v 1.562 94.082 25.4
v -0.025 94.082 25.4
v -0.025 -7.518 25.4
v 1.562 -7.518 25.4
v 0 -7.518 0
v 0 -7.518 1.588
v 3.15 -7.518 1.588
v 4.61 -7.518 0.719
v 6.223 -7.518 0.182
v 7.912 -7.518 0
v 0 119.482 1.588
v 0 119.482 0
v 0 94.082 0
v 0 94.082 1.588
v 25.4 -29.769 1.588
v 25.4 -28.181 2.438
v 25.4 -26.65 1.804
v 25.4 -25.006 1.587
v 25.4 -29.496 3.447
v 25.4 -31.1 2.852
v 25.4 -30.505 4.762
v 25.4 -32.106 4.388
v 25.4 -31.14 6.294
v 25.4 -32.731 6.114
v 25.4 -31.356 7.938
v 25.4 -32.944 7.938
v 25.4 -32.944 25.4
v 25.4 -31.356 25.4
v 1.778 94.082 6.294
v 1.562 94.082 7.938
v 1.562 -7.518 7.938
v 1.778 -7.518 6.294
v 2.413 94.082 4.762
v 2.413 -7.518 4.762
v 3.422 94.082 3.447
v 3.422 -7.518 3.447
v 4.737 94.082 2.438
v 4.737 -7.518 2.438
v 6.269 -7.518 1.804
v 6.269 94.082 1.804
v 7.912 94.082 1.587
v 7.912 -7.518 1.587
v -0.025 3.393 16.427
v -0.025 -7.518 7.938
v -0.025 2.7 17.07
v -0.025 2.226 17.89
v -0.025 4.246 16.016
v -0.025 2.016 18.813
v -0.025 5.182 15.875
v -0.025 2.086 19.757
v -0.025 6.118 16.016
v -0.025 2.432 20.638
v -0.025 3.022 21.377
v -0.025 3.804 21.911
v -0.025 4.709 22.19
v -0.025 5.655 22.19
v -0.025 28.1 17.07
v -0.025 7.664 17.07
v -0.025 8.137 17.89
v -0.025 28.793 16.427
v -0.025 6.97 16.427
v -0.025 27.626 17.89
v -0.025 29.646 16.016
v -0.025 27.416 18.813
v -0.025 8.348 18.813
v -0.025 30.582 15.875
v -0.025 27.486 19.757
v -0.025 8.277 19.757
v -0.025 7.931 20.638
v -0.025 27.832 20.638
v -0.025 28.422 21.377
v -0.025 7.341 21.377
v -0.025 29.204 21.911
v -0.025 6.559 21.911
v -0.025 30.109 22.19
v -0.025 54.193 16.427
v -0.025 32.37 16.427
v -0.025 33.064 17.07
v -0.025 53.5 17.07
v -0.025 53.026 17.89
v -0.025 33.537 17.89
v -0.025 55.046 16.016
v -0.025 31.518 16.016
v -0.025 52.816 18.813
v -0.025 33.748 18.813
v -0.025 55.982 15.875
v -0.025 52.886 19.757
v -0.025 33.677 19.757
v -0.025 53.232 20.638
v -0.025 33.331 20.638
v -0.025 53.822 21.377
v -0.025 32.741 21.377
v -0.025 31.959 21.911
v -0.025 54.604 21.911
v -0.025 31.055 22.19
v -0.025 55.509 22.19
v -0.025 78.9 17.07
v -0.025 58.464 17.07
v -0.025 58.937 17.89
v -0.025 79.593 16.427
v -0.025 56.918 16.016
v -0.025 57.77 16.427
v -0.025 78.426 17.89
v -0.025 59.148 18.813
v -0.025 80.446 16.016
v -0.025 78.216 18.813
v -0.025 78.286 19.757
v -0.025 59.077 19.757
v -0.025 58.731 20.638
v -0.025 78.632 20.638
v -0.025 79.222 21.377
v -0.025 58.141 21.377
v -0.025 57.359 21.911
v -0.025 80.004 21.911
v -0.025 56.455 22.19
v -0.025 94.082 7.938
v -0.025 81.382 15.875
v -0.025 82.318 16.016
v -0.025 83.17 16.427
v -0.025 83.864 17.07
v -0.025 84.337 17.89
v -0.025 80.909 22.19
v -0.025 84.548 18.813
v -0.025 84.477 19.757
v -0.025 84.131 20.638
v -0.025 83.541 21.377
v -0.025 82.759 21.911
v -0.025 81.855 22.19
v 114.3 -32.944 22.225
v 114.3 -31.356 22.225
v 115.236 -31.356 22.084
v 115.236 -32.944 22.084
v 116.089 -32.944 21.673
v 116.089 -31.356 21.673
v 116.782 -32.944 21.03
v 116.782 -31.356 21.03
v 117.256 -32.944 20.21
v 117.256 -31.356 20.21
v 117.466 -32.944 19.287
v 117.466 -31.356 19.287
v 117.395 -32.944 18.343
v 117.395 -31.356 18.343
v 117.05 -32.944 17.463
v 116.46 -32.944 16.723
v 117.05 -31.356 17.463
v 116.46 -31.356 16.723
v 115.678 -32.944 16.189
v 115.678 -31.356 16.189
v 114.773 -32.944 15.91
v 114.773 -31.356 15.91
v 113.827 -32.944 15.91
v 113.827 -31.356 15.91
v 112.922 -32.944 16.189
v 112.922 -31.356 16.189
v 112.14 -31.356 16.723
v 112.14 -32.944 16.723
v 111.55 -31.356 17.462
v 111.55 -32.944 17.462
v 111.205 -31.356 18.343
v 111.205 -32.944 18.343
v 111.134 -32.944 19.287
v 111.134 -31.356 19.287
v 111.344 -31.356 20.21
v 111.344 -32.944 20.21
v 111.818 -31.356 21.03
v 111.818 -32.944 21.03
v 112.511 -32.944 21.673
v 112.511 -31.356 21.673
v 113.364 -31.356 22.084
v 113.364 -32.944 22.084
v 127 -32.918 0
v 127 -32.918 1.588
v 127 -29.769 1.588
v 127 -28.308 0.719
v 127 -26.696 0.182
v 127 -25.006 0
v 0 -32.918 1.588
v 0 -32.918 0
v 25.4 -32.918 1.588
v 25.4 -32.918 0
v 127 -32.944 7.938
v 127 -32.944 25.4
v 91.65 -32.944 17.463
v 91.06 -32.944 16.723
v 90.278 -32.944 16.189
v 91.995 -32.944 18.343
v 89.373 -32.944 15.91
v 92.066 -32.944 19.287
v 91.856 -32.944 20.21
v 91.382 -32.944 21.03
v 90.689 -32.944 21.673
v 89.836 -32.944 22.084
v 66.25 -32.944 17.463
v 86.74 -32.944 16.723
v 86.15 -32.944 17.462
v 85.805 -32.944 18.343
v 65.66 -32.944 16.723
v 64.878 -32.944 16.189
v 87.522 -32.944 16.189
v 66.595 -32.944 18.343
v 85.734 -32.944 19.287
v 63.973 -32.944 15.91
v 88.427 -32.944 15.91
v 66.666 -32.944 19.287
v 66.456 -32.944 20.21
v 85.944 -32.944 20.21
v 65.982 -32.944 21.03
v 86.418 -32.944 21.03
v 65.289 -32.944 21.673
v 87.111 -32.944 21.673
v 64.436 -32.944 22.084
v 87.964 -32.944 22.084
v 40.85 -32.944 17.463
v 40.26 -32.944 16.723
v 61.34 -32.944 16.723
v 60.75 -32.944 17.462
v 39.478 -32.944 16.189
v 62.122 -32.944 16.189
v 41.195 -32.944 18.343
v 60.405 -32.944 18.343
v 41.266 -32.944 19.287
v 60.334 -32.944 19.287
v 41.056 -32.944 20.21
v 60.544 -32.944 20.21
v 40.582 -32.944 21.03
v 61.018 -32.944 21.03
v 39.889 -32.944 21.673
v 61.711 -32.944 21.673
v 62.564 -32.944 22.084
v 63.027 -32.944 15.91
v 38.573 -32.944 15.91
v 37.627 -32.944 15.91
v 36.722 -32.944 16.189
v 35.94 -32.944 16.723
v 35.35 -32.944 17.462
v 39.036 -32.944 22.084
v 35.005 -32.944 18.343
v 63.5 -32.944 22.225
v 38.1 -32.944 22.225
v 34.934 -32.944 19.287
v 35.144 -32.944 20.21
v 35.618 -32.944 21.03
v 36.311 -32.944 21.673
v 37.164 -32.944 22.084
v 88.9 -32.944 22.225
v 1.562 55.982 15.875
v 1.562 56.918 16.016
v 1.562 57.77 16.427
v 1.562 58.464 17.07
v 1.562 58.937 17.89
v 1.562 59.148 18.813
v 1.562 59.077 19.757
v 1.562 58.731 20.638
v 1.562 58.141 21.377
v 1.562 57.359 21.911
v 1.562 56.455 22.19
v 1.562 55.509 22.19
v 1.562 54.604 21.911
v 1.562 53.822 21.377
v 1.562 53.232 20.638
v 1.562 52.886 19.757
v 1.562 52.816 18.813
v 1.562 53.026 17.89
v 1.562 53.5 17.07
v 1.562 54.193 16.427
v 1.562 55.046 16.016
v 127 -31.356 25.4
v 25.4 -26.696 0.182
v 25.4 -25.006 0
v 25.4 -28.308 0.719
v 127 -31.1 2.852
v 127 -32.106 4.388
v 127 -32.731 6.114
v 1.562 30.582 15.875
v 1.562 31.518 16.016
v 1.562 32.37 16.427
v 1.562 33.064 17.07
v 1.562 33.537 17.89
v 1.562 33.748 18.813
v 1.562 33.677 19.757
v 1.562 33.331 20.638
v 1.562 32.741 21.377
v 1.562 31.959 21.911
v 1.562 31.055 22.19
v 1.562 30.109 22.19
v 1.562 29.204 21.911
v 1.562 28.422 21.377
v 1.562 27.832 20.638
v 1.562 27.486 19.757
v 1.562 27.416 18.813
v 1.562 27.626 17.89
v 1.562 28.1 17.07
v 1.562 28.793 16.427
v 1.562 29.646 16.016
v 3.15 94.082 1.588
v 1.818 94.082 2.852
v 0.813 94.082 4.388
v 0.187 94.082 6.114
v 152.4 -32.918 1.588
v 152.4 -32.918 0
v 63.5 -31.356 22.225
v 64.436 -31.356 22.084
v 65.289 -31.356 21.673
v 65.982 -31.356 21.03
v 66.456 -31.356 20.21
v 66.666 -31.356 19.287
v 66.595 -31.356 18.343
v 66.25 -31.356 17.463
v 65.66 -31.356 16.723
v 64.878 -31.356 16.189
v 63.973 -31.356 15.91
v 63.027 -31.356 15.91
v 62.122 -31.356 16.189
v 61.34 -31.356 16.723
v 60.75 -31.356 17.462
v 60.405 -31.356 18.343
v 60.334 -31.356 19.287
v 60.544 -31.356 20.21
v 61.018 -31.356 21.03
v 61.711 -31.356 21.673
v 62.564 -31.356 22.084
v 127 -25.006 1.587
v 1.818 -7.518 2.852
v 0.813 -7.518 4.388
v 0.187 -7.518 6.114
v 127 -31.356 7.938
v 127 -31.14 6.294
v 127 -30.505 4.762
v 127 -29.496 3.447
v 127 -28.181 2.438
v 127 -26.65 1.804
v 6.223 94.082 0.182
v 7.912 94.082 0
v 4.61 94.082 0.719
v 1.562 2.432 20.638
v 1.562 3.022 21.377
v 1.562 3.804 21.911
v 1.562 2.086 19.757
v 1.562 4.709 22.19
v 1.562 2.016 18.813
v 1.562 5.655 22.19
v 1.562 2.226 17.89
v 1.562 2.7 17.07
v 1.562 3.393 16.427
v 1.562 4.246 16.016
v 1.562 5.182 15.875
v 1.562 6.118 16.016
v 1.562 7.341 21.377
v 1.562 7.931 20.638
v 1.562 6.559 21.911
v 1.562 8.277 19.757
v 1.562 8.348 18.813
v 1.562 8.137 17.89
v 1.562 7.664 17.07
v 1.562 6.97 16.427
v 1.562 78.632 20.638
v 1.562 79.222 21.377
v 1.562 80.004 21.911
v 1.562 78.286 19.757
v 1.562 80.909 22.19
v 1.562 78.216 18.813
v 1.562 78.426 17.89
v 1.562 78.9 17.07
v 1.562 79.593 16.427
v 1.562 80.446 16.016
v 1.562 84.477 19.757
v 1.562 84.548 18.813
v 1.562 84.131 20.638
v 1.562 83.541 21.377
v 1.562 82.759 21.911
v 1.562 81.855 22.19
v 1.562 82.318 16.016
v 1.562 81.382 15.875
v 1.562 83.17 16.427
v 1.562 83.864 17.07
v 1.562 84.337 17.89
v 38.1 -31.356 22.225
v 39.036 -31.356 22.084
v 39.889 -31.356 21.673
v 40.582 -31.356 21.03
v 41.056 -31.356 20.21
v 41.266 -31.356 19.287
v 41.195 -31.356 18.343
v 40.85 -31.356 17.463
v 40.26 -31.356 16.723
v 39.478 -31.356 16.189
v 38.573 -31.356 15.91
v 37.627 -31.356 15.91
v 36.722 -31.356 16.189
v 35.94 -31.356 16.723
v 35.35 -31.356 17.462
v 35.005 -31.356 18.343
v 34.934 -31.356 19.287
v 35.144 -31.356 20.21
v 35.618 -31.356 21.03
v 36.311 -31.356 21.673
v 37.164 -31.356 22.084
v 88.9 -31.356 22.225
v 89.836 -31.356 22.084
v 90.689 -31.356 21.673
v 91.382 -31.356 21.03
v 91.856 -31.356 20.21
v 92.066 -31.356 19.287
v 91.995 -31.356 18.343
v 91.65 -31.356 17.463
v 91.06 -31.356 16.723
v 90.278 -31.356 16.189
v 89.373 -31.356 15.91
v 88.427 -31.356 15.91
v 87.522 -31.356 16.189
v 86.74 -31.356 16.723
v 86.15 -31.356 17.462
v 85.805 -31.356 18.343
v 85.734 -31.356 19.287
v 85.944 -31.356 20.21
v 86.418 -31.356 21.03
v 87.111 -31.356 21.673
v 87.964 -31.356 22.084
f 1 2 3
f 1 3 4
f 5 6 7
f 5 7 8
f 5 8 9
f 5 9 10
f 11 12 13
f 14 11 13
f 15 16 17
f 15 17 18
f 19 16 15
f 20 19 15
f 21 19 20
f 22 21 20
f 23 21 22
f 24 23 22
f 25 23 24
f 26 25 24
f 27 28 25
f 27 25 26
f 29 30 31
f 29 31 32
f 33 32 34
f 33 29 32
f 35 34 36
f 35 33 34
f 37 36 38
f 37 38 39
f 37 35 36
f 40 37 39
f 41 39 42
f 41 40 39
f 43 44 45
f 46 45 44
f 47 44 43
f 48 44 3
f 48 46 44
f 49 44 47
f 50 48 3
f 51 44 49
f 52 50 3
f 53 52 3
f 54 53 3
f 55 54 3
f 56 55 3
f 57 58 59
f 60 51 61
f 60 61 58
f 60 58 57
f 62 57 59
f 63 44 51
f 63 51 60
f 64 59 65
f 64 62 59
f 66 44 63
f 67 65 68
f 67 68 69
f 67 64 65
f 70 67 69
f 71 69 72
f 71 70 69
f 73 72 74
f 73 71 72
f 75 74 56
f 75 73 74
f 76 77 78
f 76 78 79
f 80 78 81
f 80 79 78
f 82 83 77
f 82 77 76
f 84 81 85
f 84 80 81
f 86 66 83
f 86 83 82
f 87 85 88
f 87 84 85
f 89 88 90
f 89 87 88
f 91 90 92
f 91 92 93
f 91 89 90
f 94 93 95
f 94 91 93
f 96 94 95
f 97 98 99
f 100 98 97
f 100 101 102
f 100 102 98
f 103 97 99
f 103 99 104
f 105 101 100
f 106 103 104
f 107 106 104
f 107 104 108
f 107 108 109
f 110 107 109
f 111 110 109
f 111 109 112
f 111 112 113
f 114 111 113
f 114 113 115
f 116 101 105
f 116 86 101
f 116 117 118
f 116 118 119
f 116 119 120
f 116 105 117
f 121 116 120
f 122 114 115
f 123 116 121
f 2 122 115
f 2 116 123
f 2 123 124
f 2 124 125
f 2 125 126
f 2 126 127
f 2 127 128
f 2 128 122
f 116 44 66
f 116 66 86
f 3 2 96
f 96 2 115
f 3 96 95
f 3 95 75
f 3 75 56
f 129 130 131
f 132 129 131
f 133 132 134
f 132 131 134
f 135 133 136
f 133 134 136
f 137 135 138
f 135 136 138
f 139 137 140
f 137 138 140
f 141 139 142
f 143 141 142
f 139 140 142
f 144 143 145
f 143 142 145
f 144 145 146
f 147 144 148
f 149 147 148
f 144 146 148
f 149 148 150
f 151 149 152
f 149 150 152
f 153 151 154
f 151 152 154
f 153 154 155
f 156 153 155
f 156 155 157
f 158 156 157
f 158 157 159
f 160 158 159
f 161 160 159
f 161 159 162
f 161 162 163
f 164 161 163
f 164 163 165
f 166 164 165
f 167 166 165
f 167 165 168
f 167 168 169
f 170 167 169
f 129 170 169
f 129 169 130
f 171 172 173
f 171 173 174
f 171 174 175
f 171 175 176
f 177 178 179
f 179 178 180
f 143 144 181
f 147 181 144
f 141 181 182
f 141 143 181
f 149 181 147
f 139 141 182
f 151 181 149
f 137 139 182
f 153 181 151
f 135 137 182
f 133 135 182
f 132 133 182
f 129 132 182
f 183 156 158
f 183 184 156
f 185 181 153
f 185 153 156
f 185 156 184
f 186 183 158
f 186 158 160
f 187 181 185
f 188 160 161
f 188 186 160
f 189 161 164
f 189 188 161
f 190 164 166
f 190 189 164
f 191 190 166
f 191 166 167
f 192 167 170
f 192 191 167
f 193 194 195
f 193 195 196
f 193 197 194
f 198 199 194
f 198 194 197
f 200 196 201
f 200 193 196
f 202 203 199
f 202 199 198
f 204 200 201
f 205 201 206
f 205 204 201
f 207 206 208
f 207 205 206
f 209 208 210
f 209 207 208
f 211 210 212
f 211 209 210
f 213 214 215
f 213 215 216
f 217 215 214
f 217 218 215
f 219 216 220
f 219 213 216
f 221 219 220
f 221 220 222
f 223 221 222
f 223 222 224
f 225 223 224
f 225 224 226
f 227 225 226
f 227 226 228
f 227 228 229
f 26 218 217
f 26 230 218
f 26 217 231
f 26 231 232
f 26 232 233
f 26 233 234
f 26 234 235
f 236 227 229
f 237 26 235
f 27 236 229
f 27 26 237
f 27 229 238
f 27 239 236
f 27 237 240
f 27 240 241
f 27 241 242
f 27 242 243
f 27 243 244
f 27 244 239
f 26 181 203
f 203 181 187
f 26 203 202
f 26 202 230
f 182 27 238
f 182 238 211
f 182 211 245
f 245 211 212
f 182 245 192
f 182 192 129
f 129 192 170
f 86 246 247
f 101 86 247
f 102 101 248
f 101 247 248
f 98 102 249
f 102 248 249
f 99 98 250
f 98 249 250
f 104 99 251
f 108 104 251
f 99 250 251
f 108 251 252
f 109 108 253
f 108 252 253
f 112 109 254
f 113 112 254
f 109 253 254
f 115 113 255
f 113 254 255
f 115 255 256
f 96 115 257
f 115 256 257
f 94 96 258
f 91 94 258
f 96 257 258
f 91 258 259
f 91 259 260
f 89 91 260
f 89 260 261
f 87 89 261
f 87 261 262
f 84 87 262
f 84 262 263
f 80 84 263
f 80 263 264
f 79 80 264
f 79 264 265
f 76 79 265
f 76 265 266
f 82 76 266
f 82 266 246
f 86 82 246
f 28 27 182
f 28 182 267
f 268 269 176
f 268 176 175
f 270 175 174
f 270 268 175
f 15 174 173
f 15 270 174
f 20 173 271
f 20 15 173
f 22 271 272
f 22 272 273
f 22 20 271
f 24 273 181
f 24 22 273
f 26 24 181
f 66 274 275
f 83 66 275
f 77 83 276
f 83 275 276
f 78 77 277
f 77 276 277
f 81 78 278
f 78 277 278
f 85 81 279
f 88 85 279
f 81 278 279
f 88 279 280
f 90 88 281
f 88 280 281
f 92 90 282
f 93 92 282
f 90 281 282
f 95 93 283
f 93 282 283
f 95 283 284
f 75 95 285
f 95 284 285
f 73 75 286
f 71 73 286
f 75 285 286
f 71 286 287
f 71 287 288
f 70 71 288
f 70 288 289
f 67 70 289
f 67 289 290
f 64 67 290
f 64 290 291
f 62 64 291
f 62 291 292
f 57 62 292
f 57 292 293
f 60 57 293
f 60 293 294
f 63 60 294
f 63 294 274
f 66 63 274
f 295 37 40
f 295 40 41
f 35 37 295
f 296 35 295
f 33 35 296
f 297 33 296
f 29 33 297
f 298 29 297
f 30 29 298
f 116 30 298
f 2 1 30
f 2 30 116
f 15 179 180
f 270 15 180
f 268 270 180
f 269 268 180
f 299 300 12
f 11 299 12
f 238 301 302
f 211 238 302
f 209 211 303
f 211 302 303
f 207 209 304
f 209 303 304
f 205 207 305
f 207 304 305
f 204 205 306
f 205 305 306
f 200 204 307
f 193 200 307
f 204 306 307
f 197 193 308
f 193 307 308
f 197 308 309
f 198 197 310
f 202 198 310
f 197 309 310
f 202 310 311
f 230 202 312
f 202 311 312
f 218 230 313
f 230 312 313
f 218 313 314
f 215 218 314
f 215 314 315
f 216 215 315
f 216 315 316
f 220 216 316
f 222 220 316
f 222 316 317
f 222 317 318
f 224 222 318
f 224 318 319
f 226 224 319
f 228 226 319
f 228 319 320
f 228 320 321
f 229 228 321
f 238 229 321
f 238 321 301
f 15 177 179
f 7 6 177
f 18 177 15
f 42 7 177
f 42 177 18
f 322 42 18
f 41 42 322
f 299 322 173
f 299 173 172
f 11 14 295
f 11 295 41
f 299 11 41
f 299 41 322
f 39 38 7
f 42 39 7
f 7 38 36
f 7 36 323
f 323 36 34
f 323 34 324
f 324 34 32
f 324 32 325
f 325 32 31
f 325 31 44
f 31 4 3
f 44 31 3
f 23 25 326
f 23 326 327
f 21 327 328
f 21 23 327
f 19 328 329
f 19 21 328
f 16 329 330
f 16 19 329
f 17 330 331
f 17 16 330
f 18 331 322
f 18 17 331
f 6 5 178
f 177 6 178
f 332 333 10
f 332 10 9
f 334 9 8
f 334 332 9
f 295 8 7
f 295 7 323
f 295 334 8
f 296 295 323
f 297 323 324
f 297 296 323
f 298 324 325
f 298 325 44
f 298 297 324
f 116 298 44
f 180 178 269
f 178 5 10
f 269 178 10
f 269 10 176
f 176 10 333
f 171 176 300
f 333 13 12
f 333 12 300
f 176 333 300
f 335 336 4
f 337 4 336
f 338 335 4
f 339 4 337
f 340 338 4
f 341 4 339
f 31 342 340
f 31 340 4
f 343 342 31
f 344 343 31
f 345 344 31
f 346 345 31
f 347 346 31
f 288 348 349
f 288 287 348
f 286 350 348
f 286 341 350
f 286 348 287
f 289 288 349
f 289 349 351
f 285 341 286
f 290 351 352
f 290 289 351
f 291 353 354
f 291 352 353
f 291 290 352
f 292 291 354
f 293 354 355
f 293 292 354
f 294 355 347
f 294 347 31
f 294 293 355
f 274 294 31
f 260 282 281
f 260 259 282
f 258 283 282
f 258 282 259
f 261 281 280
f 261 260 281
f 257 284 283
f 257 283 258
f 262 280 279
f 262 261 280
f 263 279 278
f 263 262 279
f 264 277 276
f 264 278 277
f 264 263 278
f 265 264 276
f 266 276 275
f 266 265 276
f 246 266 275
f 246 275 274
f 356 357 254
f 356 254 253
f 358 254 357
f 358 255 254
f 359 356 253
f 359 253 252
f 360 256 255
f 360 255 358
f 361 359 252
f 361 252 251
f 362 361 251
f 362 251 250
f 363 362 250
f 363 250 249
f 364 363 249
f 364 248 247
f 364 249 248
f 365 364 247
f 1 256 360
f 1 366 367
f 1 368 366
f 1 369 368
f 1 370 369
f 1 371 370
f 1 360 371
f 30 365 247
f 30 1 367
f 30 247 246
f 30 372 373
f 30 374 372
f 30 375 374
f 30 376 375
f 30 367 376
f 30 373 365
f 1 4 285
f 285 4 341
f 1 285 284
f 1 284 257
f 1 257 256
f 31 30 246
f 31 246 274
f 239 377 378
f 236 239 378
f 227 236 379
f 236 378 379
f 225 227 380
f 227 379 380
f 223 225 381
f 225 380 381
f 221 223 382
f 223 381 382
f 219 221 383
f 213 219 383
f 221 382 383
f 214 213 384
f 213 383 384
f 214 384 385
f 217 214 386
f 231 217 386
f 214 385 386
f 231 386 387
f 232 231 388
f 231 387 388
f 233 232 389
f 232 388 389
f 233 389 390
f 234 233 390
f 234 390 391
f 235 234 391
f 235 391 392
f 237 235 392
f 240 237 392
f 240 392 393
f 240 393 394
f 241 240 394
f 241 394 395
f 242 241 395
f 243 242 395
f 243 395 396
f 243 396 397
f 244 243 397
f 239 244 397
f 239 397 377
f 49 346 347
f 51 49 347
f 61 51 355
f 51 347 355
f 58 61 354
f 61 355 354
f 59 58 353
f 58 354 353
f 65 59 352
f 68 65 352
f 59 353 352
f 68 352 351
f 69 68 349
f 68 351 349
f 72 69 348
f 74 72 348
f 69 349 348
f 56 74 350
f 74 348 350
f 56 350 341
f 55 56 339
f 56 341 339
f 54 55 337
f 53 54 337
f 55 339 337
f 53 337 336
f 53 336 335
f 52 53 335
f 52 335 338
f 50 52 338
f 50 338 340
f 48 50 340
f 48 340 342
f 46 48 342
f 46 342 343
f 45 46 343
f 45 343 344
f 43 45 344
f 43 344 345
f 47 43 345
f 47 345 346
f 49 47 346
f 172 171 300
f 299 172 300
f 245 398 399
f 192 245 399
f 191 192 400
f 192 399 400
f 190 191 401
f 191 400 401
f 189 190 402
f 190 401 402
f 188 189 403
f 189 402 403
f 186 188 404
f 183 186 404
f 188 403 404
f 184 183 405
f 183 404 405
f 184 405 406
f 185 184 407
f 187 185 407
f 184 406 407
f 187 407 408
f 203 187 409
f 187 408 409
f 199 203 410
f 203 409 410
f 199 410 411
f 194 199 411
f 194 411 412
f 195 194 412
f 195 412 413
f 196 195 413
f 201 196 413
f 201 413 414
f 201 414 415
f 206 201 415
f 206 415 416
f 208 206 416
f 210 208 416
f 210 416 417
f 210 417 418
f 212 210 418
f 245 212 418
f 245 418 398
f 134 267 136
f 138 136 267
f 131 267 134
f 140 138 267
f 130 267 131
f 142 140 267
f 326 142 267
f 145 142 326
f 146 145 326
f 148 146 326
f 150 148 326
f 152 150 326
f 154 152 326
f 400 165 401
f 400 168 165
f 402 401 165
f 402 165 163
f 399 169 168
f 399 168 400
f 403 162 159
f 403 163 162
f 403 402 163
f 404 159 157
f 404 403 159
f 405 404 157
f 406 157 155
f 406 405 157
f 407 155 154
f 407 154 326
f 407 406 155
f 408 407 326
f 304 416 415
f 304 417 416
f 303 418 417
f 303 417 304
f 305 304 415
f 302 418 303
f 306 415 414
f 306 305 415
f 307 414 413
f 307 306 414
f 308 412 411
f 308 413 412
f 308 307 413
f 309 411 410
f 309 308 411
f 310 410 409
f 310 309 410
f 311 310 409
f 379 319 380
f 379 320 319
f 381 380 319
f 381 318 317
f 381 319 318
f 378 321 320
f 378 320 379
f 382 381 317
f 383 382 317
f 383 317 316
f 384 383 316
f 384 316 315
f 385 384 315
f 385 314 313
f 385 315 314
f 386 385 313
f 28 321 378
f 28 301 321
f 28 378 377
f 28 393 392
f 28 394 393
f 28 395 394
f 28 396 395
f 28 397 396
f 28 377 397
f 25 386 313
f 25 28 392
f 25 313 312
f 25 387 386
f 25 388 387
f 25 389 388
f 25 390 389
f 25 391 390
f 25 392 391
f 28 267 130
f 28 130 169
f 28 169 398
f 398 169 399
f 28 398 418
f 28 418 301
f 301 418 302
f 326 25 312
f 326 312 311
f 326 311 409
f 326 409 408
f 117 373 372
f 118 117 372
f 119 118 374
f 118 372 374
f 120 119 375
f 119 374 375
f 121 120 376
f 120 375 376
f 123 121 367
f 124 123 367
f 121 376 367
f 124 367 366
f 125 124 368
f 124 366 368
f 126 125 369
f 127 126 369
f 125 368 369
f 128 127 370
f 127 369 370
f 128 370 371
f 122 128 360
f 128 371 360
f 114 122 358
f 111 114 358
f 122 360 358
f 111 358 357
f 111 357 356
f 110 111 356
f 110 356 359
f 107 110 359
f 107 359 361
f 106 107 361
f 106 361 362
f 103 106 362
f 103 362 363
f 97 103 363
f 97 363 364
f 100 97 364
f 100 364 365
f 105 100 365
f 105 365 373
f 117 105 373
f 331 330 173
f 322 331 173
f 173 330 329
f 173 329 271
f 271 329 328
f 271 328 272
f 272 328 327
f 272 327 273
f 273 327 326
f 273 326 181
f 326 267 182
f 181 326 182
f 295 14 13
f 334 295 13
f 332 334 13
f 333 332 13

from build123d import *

# Parameters (mm, degrees)
BOSS_EXTRUDE1_DEPTH          = 1.5875
SKETCH7_W                    = 1.5875
SKETCH7_H                    = 101.6
BOSS_EXTRUDE2_DEPTH          = 0.0254
EDGE_FLANGE1_STRIP_W         = 19.05
EDGE_FLANGE1_STRIP_H         = 1.5875
EDGE_FLANGE1_STRIP_CUT_DEPTH = 101.6
EDGE_FLANGE1_DEPTH           = 101.6
SKETCH11_W                   = 101.6
SKETCH11_H                   = 1.5875
BOSS_EXTRUDE3_DEPTH          = 0.0254
EDGE_FLANGE2_STRIP_W         = 19.05
EDGE_FLANGE2_STRIP_H         = 1.5875
EDGE_FLANGE2_STRIP_CUT_DEPTH = 101.6
EDGE_FLANGE2_DEPTH           = 101.6
SKETCH15_R                   = 3.175
CUT_EXTRUDE1_DEPTH           = 2.54
SKETCH16_R                   = 3.175
CUT_EXTRUDE2_DEPTH           = 2.54


# Sheet-metal steps are written as plain solids
with BuildPart() as part:
    # Sketch1 → Boss-Extrude1 (new body)
    with BuildSketch(Plane.XY):
        Polygon((0, 119.481843199), (0, -32.918156801), (152.4, -32.918156801), align=None)
    extrude(amount=BOSS_EXTRUDE1_DEPTH)

    # Sketch7 → Boss-Extrude2 (add)
    with BuildSketch(Plane.ZY):
        with Locations((0.79375, 43.281843199)):
            Rectangle(SKETCH7_W, SKETCH7_H)
    extrude(amount=BOSS_EXTRUDE2_DEPTH)

    # Edge-Flange1 strip (across the edge) → Edge-Flange1 strip cut (cut)
    with BuildSketch(Plane(origin=(-0.0254, 94.081843199, 1.5875), x_dir=(1, 0, 0), z_dir=(0, -1, 0))):
        with Locations((-1.5875, -0.79375)):
            Rectangle(EDGE_FLANGE1_STRIP_W, EDGE_FLANGE1_STRIP_H)
    extrude(amount=EDGE_FLANGE1_STRIP_CUT_DEPTH, mode=Mode.SUBTRACT)

    # Edge-Flange1 section (across the edge) → Edge-Flange1 (add)
    with BuildSketch(Plane(origin=(-0.0254, 94.081843199, 1.5875), x_dir=(1, 0, 0), z_dir=(0, -1, 0))):
        with BuildLine():
            Line((0, 6.35), (0, 23.8125))
            Line((0, 23.8125), (1.5875, 23.8125))
            Line((1.5875, 23.8125), (1.5875, 6.35))
            ThreePointArc((1.5875, 6.35), (3.447371939, 1.859871939), (7.9375, 0))
            Line((7.9375, 0), (7.9375, -1.5875))
            ThreePointArc((7.9375, -1.5875), (2.324839924, 0.737339924), (0, 6.35))
        make_face()
    extrude(amount=EDGE_FLANGE1_DEPTH)

    # Sketch11 → Boss-Extrude3 (add)
    with BuildSketch(Plane(origin=(0, -32.918156801, 0), x_dir=(-1, 0, 0), z_dir=(0, -1, 0))):
        with Locations((-76.2, -0.79375)):
            Rectangle(SKETCH11_W, SKETCH11_H)
    extrude(amount=BOSS_EXTRUDE3_DEPTH)

    # Edge-Flange2 strip (across the edge) → Edge-Flange2 strip cut (cut)
    with BuildSketch(Plane(origin=(25.4, -32.943556801, 1.5875), x_dir=(0, 1, 0), z_dir=(1, 0, 0))):
        with Locations((-1.5875, -0.79375)):
            Rectangle(EDGE_FLANGE2_STRIP_W, EDGE_FLANGE2_STRIP_H)
    extrude(amount=EDGE_FLANGE2_STRIP_CUT_DEPTH, mode=Mode.SUBTRACT)

    # Edge-Flange2 section (across the edge) → Edge-Flange2 (add)
    with BuildSketch(Plane(origin=(25.4, -32.943556801, 1.5875), x_dir=(0, 1, 0), z_dir=(1, 0, 0))):
        with BuildLine():
            Line((0, 6.35), (0, 23.8125))
            Line((0, 23.8125), (1.5875, 23.8125))
            Line((1.5875, 23.8125), (1.5875, 6.35))
            ThreePointArc((1.5875, 6.35), (3.447371939, 1.859871939), (7.9375, 0))
            Line((7.9375, 0), (7.9375, -1.5875))
            ThreePointArc((7.9375, -1.5875), (2.324839924, 0.737339924), (0, 6.35))
        make_face()
    extrude(amount=EDGE_FLANGE2_DEPTH)

    # Sketch15 → Cut-Extrude1 (cut)
    with BuildSketch(Plane(origin=(0, -31.356056801, 0), x_dir=(1, 0, 0), z_dir=(0, 1, 0))):
        with Locations(Location((38.1, -19.05, 0), (0, 0, 270))):
            Circle(SKETCH15_R)
        with Locations(Location((63.5, -19.05, 0), (0, 0, 270))):
            Circle(SKETCH15_R)
        with Locations(Location((88.9, -19.05, 0), (0, 0, 270))):
            Circle(SKETCH15_R)
        with Locations(Location((114.3, -19.05, 0), (0, 0, 270))):
            Circle(SKETCH15_R)
    extrude(amount=-CUT_EXTRUDE1_DEPTH, mode=Mode.SUBTRACT)

    # Sketch16 → Cut-Extrude2 (cut)
    with BuildSketch(Plane(origin=(1.5621, 0, 0), x_dir=(0, 0, -1), z_dir=(1, 0, 0))):
        with Locations((-19.05, 81.381843199)):
            Circle(SKETCH16_R)
        with Locations((-19.05, 55.981843199)):
            Circle(SKETCH16_R)
        with Locations((-19.05, 30.581843199)):
            Circle(SKETCH16_R)
        with Locations((-19.05, 5.181843199)):
            Circle(SKETCH16_R)
    extrude(amount=-CUT_EXTRUDE2_DEPTH, mode=Mode.SUBTRACT)


solid = part.part
